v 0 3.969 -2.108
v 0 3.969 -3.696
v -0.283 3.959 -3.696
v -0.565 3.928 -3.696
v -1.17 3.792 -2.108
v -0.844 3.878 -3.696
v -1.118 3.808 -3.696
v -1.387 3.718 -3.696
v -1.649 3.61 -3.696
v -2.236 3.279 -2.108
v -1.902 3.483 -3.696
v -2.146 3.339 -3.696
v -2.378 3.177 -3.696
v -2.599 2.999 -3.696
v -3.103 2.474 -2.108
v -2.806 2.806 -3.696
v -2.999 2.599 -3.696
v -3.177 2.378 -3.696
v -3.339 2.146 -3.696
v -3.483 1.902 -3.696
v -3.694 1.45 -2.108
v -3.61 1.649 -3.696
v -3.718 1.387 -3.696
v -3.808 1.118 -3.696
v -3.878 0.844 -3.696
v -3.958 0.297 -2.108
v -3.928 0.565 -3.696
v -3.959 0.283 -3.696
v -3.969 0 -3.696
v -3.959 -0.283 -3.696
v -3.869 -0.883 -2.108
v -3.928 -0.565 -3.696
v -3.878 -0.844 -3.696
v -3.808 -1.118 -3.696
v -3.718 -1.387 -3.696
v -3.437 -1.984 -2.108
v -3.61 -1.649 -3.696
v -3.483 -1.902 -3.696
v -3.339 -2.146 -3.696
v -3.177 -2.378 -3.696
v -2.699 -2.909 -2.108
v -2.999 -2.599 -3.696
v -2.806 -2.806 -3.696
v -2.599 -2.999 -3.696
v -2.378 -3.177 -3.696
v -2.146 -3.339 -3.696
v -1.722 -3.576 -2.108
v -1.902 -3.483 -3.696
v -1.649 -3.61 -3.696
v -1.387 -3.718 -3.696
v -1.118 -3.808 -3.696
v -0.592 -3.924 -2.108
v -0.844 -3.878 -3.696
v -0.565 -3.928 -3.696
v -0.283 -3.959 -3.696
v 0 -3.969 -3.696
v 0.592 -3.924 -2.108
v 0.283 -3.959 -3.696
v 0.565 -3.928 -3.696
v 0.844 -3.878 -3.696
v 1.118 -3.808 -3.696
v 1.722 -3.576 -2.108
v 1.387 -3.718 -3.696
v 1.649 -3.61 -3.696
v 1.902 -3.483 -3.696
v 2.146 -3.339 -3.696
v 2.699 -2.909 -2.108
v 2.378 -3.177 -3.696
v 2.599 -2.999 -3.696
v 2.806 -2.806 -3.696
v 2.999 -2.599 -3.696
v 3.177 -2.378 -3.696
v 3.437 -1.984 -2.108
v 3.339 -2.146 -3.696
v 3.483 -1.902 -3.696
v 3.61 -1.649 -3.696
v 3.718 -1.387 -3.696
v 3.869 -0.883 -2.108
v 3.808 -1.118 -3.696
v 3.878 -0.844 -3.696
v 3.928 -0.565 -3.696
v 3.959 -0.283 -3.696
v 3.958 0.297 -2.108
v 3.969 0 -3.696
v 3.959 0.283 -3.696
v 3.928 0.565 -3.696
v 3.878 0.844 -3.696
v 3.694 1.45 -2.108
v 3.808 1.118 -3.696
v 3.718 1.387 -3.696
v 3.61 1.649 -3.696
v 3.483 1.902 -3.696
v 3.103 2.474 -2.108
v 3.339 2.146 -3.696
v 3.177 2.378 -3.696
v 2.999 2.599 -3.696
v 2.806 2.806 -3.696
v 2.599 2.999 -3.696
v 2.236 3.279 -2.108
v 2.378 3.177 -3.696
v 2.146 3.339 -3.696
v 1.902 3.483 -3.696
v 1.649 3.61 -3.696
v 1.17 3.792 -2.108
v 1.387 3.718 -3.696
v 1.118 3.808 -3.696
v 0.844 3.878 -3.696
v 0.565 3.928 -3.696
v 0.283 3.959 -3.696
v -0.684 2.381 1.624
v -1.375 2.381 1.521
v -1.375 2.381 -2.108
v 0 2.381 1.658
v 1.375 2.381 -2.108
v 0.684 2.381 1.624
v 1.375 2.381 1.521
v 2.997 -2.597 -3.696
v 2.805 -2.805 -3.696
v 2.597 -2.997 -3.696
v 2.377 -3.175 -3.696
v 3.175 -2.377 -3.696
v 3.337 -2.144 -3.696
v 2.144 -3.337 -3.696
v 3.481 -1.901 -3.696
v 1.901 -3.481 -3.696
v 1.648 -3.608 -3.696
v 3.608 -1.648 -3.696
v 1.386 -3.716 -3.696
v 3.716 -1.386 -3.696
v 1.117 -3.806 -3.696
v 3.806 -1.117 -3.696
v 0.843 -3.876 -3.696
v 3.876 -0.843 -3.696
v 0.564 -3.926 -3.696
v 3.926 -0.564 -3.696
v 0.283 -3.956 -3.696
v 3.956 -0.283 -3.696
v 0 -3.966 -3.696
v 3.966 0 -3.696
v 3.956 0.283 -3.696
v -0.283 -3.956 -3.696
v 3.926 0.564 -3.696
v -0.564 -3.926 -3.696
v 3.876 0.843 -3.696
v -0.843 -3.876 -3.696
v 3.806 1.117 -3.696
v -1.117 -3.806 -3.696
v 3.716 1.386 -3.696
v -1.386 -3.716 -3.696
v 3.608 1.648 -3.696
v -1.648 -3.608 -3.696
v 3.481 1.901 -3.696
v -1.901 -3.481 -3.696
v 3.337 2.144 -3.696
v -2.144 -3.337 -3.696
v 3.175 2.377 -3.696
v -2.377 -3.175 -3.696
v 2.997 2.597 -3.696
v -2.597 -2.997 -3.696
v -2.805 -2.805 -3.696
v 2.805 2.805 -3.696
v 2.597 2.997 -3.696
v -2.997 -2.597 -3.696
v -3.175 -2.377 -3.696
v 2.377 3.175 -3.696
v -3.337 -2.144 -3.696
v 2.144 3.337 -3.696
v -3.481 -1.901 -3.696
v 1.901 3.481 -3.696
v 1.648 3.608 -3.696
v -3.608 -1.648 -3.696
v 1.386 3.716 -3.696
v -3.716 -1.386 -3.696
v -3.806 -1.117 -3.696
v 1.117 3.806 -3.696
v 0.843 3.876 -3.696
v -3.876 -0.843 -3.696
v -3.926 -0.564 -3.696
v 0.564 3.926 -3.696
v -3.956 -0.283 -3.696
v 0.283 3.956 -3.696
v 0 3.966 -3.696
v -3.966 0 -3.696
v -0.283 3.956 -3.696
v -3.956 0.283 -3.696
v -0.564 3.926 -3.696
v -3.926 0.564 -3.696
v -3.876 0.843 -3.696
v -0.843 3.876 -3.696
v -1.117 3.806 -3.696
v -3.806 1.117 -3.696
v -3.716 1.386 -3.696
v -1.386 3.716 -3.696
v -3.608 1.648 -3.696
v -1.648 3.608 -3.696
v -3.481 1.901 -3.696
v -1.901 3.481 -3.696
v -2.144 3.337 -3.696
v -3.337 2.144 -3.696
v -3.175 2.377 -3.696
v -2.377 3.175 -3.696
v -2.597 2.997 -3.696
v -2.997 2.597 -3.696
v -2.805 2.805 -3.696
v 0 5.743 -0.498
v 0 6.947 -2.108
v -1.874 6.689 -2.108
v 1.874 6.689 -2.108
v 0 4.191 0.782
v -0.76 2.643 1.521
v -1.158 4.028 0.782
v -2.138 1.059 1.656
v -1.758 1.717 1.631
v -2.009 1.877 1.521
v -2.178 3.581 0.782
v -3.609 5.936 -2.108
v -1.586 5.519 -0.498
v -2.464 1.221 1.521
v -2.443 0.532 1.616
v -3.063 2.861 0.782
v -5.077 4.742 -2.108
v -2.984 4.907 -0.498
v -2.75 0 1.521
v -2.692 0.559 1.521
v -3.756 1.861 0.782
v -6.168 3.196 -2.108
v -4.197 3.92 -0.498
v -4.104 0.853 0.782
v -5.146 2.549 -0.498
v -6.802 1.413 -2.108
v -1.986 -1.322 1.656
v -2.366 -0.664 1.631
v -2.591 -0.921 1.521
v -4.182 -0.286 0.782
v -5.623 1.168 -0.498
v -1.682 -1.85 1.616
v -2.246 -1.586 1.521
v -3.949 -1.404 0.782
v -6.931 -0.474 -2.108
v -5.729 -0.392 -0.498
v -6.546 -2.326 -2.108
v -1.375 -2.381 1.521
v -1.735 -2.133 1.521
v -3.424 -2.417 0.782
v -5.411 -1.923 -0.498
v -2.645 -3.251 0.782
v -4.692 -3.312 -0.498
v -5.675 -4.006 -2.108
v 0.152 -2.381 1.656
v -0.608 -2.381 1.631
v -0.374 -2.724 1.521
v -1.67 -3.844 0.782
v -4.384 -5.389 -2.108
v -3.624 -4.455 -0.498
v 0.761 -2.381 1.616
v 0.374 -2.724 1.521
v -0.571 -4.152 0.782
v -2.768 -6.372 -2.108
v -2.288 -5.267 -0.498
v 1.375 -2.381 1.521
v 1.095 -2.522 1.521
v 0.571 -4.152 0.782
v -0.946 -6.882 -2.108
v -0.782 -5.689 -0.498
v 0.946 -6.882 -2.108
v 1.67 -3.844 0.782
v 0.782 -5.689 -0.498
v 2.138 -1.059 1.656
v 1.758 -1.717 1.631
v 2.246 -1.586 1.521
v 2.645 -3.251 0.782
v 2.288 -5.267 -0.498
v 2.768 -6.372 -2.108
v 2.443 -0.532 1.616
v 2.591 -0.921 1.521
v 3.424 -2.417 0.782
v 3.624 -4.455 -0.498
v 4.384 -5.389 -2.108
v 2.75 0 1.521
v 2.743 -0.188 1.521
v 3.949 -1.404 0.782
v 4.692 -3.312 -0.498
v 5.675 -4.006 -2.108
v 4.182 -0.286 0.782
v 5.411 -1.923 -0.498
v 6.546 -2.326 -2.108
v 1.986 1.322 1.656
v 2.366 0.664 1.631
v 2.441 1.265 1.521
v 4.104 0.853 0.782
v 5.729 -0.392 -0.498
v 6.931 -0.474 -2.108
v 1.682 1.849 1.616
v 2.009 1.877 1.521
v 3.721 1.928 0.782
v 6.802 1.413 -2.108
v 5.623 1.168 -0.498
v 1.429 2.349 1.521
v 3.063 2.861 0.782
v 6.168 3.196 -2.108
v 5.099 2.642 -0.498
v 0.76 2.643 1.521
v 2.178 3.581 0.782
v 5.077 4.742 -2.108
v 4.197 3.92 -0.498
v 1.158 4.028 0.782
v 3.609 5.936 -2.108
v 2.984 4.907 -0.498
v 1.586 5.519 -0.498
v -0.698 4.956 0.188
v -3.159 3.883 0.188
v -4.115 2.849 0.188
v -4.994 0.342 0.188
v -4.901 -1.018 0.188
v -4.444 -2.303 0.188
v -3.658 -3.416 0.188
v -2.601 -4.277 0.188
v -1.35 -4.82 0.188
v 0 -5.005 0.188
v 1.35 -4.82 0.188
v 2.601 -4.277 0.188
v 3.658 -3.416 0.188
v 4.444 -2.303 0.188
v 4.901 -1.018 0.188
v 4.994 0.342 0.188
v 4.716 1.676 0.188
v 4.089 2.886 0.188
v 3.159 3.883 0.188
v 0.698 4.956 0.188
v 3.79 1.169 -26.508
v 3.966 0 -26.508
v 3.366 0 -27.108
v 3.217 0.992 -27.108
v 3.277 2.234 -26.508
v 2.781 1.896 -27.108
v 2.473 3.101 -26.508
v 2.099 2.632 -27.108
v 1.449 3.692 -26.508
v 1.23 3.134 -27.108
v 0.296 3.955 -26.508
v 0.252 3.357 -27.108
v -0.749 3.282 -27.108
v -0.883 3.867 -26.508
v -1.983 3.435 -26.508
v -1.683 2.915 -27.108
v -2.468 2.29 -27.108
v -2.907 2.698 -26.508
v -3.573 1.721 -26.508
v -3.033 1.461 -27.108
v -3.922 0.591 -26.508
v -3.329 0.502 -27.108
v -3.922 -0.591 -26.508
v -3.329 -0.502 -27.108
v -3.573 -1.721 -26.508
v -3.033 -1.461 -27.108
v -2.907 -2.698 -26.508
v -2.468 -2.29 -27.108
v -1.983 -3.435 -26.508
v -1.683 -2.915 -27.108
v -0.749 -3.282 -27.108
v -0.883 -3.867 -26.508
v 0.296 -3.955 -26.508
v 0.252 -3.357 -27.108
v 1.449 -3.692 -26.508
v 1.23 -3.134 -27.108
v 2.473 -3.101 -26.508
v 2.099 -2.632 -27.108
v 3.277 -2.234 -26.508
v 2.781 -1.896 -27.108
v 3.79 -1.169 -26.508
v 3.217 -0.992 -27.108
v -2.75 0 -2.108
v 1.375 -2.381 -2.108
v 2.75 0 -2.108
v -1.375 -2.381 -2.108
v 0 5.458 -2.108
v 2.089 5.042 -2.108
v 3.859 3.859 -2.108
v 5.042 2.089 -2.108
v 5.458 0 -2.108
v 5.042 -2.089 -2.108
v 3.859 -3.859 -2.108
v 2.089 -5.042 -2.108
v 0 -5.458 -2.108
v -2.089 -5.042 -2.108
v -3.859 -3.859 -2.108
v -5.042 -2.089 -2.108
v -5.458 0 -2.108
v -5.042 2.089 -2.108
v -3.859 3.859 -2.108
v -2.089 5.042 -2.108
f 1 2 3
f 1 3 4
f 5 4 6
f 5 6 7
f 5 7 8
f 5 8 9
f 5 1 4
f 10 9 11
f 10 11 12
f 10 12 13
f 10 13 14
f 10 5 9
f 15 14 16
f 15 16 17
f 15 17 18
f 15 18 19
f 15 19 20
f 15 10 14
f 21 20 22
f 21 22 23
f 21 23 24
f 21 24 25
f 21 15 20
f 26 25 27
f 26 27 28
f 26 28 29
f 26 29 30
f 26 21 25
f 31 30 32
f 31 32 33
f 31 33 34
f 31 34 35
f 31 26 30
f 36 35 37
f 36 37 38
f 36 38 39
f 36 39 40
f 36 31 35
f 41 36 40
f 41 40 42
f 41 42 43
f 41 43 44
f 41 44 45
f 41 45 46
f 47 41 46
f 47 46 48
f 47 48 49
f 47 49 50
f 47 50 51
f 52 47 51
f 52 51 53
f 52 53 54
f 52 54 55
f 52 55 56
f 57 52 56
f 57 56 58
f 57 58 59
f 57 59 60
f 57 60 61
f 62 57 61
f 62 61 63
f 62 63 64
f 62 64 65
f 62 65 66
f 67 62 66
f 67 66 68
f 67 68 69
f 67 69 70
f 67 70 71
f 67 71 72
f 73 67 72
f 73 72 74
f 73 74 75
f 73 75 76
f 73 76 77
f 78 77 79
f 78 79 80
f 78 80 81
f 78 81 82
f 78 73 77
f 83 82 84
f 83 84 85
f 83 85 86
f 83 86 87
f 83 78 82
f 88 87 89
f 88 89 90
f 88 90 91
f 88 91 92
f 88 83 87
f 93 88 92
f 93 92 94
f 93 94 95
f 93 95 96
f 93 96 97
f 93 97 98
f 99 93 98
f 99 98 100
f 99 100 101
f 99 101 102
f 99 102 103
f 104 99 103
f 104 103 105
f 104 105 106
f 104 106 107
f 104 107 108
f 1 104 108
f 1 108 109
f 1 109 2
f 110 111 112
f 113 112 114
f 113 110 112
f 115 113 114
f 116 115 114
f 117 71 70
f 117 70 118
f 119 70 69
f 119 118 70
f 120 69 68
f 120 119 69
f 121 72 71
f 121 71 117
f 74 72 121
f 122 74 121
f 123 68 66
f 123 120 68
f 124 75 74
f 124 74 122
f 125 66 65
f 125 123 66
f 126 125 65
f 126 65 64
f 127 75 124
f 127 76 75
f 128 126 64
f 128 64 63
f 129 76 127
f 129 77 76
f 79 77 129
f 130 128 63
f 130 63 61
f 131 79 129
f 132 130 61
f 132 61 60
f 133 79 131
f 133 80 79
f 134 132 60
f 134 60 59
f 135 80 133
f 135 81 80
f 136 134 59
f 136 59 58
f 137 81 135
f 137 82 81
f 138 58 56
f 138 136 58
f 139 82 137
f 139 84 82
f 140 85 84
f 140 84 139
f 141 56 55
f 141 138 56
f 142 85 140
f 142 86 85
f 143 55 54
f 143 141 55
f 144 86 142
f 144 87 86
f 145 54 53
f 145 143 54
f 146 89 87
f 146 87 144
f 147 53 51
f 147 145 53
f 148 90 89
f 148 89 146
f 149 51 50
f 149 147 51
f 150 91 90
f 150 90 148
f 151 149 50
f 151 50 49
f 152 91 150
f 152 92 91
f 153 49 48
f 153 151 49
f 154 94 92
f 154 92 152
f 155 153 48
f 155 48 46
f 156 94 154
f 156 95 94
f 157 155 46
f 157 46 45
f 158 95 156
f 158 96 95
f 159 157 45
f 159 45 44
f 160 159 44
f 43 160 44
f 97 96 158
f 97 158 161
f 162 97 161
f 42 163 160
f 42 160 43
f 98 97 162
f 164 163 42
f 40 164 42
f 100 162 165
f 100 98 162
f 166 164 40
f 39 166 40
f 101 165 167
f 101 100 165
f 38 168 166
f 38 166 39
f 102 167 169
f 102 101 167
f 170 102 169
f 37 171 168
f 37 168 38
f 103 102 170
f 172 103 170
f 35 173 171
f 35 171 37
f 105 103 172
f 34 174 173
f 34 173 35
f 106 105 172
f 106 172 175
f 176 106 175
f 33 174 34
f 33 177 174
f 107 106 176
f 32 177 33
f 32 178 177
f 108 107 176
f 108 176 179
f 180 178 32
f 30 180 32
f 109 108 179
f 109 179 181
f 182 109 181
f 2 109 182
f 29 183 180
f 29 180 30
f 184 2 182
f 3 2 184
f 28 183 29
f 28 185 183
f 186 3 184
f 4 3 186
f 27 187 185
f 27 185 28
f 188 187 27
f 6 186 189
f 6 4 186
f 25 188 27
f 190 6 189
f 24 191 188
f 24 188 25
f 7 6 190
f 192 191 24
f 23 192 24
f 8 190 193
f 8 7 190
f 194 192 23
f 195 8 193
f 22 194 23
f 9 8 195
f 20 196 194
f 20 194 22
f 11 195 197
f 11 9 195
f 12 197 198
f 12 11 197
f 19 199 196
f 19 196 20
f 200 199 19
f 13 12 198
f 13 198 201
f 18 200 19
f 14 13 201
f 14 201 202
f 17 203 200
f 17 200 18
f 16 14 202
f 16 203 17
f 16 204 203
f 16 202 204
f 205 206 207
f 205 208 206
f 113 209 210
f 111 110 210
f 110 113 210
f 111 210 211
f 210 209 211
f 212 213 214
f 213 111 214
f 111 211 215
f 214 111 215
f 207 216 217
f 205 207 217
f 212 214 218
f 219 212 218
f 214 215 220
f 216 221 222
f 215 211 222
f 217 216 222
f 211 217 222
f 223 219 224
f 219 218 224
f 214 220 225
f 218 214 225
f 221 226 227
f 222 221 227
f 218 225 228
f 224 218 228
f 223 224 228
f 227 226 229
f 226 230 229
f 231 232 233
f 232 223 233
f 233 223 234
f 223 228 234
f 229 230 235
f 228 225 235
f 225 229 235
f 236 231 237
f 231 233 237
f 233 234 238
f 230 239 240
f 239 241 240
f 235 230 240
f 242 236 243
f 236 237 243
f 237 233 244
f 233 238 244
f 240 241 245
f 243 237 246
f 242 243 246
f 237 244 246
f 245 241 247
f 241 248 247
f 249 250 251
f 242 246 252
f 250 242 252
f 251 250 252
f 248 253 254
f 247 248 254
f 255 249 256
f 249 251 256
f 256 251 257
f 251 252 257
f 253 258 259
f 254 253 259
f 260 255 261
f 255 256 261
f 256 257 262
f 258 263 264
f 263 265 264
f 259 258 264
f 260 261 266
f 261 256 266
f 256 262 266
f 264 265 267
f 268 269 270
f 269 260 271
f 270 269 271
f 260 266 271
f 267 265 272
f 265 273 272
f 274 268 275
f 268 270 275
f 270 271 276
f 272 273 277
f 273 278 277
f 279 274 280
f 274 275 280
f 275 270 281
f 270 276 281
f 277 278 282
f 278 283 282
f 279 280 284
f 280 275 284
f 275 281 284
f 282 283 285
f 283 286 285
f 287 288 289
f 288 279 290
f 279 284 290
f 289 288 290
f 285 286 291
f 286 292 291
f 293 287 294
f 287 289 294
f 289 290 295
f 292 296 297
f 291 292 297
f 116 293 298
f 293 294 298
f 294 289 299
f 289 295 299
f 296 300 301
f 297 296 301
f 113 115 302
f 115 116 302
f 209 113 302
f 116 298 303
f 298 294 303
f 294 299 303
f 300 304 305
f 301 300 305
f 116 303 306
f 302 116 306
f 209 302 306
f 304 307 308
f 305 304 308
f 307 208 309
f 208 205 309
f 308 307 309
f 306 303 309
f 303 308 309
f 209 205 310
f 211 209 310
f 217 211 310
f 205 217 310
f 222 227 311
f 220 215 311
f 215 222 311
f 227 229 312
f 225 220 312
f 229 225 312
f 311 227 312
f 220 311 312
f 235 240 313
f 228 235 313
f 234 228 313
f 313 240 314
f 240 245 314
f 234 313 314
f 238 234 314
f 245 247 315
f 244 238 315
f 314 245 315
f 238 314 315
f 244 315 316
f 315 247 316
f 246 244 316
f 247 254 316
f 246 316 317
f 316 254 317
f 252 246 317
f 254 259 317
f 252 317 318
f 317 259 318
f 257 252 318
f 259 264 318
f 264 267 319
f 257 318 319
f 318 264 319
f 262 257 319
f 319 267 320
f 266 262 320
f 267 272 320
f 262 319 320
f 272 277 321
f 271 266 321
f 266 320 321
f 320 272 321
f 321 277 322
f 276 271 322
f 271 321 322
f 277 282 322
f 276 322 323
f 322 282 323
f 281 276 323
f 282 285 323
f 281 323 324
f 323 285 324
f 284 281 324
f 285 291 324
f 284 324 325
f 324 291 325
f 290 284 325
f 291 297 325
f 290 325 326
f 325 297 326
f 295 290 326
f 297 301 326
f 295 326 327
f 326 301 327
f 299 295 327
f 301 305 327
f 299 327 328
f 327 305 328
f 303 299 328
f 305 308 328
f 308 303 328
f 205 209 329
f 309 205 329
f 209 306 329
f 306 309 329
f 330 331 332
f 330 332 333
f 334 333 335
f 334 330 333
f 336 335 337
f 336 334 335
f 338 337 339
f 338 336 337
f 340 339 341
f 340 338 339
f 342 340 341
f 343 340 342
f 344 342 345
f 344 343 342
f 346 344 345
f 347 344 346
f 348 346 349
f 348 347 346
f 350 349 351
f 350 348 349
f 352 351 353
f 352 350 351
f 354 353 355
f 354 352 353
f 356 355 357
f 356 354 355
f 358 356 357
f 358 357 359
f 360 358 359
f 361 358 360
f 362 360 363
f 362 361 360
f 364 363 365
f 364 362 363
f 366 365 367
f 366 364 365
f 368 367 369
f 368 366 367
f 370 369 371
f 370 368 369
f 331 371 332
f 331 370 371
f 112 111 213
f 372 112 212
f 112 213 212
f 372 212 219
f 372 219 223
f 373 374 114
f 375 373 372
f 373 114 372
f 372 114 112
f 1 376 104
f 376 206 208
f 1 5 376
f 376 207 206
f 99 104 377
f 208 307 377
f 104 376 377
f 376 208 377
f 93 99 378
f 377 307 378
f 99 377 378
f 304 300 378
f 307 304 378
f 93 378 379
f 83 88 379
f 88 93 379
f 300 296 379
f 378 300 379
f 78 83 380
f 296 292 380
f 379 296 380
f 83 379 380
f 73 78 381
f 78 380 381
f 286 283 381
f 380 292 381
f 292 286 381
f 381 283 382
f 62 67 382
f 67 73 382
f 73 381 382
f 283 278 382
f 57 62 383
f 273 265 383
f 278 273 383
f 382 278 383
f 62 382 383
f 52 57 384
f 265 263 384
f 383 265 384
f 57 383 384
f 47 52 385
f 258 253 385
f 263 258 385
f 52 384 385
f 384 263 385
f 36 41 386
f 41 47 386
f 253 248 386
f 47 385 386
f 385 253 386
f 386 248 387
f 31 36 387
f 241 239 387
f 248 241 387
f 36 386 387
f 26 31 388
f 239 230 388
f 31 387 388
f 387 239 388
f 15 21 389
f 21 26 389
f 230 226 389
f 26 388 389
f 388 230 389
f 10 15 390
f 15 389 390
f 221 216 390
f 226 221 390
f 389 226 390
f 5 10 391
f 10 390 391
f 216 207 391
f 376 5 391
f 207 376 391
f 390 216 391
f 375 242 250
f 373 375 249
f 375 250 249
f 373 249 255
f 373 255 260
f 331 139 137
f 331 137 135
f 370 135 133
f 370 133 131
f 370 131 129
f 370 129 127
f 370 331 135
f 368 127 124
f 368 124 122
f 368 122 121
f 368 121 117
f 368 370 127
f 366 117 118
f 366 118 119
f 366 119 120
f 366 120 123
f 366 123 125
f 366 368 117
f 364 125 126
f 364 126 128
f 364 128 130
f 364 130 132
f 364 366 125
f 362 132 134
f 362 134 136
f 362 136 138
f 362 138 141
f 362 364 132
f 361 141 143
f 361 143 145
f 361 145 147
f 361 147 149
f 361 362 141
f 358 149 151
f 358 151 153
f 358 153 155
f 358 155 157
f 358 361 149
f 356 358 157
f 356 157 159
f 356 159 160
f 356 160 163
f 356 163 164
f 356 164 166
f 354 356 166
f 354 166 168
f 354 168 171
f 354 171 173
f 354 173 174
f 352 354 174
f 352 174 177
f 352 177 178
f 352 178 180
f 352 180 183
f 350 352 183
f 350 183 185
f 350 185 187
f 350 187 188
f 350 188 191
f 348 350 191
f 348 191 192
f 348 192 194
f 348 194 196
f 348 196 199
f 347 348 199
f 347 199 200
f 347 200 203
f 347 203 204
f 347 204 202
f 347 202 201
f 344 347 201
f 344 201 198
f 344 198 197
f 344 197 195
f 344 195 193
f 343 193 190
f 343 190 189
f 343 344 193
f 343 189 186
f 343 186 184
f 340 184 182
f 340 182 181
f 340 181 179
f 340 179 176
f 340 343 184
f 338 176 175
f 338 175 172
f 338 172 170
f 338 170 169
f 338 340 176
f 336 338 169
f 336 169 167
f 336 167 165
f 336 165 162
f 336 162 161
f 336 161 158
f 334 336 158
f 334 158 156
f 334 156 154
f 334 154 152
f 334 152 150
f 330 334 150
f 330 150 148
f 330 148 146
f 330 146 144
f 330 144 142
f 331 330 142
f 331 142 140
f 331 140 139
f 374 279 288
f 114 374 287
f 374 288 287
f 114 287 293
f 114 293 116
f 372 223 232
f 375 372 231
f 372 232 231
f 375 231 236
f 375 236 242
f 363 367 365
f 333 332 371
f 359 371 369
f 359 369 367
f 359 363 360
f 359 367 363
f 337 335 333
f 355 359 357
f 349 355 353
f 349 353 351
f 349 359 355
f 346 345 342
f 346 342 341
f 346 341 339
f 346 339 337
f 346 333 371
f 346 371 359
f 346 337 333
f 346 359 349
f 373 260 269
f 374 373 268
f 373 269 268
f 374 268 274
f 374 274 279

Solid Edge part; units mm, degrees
sketch "Sketch1" plane through (0, 0, 0) normal (1, 0, 0) x (0, 1, 0)
  line L0 (0, -2.1082) -> (0, 2.1082)
  arc A0 (0, 2.1082) -> (6.9469, -2.1082) centre (-0.3606, -6.3169) cw
  line L1 (0, -2.1082) -> (6.9469, -2.1082)
  dimension "D1" = 4.2164
  dimension "D2" = 8.4328
revolve "RevolvedProtrusion1" add sketch "Sketch1" angle 360 about axis through (0, 0, -14.7796) along (0, 0, 1)
sketch "Sketch2" plane through (0, 0, -2.1082) normal (0, 0, -1) x (0, 1, 0)
  circle A0 centre (0, 0) radius 3.9687
  dimension "D1" = 7.9375
extrude "Protrusion1" add sketch "Sketch2" along normal blind 25
sketch "Sketch3" plane through (0, 0, -27.1082) normal (0, 0, -1) x (1, 0, 0)
  circle A0 centre (0, 0) radius 3.9662
  dimension "D1" = 0.0025
extrude "Cutout1" cut sketch "Sketch3" against normal blind 23.4125 flip side to cut
sketch "Sketch4" plane through (-0.6032, 0.3606, 4.2164) normal (0, 0, 1) x (1, 0, 0)
  line L0 (-0.7716, 2.0206) -> (1.978, 2.0206)
  line L1 (3.3529, -0.3606) -> (1.978, 2.0206)
  line L2 (1.978, -2.7419) -> (3.3529, -0.3606)
  line L3 (-0.7716, -2.7419) -> (1.978, -2.7419)
  line L4 (-2.1464, -0.3606) -> (-0.7716, -2.7419)
  line L5 (-0.7716, 2.0206) -> (-2.1464, -0.3606)
extrude "ExtrudedCutout_11" cut sketch "Sketch4" against normal blind 6.3246
chamfer "Chamfer_2" distance 0.6 angle 45 1 edges at (-3.9662, 0, -27.1082)
properties part number "117753"
